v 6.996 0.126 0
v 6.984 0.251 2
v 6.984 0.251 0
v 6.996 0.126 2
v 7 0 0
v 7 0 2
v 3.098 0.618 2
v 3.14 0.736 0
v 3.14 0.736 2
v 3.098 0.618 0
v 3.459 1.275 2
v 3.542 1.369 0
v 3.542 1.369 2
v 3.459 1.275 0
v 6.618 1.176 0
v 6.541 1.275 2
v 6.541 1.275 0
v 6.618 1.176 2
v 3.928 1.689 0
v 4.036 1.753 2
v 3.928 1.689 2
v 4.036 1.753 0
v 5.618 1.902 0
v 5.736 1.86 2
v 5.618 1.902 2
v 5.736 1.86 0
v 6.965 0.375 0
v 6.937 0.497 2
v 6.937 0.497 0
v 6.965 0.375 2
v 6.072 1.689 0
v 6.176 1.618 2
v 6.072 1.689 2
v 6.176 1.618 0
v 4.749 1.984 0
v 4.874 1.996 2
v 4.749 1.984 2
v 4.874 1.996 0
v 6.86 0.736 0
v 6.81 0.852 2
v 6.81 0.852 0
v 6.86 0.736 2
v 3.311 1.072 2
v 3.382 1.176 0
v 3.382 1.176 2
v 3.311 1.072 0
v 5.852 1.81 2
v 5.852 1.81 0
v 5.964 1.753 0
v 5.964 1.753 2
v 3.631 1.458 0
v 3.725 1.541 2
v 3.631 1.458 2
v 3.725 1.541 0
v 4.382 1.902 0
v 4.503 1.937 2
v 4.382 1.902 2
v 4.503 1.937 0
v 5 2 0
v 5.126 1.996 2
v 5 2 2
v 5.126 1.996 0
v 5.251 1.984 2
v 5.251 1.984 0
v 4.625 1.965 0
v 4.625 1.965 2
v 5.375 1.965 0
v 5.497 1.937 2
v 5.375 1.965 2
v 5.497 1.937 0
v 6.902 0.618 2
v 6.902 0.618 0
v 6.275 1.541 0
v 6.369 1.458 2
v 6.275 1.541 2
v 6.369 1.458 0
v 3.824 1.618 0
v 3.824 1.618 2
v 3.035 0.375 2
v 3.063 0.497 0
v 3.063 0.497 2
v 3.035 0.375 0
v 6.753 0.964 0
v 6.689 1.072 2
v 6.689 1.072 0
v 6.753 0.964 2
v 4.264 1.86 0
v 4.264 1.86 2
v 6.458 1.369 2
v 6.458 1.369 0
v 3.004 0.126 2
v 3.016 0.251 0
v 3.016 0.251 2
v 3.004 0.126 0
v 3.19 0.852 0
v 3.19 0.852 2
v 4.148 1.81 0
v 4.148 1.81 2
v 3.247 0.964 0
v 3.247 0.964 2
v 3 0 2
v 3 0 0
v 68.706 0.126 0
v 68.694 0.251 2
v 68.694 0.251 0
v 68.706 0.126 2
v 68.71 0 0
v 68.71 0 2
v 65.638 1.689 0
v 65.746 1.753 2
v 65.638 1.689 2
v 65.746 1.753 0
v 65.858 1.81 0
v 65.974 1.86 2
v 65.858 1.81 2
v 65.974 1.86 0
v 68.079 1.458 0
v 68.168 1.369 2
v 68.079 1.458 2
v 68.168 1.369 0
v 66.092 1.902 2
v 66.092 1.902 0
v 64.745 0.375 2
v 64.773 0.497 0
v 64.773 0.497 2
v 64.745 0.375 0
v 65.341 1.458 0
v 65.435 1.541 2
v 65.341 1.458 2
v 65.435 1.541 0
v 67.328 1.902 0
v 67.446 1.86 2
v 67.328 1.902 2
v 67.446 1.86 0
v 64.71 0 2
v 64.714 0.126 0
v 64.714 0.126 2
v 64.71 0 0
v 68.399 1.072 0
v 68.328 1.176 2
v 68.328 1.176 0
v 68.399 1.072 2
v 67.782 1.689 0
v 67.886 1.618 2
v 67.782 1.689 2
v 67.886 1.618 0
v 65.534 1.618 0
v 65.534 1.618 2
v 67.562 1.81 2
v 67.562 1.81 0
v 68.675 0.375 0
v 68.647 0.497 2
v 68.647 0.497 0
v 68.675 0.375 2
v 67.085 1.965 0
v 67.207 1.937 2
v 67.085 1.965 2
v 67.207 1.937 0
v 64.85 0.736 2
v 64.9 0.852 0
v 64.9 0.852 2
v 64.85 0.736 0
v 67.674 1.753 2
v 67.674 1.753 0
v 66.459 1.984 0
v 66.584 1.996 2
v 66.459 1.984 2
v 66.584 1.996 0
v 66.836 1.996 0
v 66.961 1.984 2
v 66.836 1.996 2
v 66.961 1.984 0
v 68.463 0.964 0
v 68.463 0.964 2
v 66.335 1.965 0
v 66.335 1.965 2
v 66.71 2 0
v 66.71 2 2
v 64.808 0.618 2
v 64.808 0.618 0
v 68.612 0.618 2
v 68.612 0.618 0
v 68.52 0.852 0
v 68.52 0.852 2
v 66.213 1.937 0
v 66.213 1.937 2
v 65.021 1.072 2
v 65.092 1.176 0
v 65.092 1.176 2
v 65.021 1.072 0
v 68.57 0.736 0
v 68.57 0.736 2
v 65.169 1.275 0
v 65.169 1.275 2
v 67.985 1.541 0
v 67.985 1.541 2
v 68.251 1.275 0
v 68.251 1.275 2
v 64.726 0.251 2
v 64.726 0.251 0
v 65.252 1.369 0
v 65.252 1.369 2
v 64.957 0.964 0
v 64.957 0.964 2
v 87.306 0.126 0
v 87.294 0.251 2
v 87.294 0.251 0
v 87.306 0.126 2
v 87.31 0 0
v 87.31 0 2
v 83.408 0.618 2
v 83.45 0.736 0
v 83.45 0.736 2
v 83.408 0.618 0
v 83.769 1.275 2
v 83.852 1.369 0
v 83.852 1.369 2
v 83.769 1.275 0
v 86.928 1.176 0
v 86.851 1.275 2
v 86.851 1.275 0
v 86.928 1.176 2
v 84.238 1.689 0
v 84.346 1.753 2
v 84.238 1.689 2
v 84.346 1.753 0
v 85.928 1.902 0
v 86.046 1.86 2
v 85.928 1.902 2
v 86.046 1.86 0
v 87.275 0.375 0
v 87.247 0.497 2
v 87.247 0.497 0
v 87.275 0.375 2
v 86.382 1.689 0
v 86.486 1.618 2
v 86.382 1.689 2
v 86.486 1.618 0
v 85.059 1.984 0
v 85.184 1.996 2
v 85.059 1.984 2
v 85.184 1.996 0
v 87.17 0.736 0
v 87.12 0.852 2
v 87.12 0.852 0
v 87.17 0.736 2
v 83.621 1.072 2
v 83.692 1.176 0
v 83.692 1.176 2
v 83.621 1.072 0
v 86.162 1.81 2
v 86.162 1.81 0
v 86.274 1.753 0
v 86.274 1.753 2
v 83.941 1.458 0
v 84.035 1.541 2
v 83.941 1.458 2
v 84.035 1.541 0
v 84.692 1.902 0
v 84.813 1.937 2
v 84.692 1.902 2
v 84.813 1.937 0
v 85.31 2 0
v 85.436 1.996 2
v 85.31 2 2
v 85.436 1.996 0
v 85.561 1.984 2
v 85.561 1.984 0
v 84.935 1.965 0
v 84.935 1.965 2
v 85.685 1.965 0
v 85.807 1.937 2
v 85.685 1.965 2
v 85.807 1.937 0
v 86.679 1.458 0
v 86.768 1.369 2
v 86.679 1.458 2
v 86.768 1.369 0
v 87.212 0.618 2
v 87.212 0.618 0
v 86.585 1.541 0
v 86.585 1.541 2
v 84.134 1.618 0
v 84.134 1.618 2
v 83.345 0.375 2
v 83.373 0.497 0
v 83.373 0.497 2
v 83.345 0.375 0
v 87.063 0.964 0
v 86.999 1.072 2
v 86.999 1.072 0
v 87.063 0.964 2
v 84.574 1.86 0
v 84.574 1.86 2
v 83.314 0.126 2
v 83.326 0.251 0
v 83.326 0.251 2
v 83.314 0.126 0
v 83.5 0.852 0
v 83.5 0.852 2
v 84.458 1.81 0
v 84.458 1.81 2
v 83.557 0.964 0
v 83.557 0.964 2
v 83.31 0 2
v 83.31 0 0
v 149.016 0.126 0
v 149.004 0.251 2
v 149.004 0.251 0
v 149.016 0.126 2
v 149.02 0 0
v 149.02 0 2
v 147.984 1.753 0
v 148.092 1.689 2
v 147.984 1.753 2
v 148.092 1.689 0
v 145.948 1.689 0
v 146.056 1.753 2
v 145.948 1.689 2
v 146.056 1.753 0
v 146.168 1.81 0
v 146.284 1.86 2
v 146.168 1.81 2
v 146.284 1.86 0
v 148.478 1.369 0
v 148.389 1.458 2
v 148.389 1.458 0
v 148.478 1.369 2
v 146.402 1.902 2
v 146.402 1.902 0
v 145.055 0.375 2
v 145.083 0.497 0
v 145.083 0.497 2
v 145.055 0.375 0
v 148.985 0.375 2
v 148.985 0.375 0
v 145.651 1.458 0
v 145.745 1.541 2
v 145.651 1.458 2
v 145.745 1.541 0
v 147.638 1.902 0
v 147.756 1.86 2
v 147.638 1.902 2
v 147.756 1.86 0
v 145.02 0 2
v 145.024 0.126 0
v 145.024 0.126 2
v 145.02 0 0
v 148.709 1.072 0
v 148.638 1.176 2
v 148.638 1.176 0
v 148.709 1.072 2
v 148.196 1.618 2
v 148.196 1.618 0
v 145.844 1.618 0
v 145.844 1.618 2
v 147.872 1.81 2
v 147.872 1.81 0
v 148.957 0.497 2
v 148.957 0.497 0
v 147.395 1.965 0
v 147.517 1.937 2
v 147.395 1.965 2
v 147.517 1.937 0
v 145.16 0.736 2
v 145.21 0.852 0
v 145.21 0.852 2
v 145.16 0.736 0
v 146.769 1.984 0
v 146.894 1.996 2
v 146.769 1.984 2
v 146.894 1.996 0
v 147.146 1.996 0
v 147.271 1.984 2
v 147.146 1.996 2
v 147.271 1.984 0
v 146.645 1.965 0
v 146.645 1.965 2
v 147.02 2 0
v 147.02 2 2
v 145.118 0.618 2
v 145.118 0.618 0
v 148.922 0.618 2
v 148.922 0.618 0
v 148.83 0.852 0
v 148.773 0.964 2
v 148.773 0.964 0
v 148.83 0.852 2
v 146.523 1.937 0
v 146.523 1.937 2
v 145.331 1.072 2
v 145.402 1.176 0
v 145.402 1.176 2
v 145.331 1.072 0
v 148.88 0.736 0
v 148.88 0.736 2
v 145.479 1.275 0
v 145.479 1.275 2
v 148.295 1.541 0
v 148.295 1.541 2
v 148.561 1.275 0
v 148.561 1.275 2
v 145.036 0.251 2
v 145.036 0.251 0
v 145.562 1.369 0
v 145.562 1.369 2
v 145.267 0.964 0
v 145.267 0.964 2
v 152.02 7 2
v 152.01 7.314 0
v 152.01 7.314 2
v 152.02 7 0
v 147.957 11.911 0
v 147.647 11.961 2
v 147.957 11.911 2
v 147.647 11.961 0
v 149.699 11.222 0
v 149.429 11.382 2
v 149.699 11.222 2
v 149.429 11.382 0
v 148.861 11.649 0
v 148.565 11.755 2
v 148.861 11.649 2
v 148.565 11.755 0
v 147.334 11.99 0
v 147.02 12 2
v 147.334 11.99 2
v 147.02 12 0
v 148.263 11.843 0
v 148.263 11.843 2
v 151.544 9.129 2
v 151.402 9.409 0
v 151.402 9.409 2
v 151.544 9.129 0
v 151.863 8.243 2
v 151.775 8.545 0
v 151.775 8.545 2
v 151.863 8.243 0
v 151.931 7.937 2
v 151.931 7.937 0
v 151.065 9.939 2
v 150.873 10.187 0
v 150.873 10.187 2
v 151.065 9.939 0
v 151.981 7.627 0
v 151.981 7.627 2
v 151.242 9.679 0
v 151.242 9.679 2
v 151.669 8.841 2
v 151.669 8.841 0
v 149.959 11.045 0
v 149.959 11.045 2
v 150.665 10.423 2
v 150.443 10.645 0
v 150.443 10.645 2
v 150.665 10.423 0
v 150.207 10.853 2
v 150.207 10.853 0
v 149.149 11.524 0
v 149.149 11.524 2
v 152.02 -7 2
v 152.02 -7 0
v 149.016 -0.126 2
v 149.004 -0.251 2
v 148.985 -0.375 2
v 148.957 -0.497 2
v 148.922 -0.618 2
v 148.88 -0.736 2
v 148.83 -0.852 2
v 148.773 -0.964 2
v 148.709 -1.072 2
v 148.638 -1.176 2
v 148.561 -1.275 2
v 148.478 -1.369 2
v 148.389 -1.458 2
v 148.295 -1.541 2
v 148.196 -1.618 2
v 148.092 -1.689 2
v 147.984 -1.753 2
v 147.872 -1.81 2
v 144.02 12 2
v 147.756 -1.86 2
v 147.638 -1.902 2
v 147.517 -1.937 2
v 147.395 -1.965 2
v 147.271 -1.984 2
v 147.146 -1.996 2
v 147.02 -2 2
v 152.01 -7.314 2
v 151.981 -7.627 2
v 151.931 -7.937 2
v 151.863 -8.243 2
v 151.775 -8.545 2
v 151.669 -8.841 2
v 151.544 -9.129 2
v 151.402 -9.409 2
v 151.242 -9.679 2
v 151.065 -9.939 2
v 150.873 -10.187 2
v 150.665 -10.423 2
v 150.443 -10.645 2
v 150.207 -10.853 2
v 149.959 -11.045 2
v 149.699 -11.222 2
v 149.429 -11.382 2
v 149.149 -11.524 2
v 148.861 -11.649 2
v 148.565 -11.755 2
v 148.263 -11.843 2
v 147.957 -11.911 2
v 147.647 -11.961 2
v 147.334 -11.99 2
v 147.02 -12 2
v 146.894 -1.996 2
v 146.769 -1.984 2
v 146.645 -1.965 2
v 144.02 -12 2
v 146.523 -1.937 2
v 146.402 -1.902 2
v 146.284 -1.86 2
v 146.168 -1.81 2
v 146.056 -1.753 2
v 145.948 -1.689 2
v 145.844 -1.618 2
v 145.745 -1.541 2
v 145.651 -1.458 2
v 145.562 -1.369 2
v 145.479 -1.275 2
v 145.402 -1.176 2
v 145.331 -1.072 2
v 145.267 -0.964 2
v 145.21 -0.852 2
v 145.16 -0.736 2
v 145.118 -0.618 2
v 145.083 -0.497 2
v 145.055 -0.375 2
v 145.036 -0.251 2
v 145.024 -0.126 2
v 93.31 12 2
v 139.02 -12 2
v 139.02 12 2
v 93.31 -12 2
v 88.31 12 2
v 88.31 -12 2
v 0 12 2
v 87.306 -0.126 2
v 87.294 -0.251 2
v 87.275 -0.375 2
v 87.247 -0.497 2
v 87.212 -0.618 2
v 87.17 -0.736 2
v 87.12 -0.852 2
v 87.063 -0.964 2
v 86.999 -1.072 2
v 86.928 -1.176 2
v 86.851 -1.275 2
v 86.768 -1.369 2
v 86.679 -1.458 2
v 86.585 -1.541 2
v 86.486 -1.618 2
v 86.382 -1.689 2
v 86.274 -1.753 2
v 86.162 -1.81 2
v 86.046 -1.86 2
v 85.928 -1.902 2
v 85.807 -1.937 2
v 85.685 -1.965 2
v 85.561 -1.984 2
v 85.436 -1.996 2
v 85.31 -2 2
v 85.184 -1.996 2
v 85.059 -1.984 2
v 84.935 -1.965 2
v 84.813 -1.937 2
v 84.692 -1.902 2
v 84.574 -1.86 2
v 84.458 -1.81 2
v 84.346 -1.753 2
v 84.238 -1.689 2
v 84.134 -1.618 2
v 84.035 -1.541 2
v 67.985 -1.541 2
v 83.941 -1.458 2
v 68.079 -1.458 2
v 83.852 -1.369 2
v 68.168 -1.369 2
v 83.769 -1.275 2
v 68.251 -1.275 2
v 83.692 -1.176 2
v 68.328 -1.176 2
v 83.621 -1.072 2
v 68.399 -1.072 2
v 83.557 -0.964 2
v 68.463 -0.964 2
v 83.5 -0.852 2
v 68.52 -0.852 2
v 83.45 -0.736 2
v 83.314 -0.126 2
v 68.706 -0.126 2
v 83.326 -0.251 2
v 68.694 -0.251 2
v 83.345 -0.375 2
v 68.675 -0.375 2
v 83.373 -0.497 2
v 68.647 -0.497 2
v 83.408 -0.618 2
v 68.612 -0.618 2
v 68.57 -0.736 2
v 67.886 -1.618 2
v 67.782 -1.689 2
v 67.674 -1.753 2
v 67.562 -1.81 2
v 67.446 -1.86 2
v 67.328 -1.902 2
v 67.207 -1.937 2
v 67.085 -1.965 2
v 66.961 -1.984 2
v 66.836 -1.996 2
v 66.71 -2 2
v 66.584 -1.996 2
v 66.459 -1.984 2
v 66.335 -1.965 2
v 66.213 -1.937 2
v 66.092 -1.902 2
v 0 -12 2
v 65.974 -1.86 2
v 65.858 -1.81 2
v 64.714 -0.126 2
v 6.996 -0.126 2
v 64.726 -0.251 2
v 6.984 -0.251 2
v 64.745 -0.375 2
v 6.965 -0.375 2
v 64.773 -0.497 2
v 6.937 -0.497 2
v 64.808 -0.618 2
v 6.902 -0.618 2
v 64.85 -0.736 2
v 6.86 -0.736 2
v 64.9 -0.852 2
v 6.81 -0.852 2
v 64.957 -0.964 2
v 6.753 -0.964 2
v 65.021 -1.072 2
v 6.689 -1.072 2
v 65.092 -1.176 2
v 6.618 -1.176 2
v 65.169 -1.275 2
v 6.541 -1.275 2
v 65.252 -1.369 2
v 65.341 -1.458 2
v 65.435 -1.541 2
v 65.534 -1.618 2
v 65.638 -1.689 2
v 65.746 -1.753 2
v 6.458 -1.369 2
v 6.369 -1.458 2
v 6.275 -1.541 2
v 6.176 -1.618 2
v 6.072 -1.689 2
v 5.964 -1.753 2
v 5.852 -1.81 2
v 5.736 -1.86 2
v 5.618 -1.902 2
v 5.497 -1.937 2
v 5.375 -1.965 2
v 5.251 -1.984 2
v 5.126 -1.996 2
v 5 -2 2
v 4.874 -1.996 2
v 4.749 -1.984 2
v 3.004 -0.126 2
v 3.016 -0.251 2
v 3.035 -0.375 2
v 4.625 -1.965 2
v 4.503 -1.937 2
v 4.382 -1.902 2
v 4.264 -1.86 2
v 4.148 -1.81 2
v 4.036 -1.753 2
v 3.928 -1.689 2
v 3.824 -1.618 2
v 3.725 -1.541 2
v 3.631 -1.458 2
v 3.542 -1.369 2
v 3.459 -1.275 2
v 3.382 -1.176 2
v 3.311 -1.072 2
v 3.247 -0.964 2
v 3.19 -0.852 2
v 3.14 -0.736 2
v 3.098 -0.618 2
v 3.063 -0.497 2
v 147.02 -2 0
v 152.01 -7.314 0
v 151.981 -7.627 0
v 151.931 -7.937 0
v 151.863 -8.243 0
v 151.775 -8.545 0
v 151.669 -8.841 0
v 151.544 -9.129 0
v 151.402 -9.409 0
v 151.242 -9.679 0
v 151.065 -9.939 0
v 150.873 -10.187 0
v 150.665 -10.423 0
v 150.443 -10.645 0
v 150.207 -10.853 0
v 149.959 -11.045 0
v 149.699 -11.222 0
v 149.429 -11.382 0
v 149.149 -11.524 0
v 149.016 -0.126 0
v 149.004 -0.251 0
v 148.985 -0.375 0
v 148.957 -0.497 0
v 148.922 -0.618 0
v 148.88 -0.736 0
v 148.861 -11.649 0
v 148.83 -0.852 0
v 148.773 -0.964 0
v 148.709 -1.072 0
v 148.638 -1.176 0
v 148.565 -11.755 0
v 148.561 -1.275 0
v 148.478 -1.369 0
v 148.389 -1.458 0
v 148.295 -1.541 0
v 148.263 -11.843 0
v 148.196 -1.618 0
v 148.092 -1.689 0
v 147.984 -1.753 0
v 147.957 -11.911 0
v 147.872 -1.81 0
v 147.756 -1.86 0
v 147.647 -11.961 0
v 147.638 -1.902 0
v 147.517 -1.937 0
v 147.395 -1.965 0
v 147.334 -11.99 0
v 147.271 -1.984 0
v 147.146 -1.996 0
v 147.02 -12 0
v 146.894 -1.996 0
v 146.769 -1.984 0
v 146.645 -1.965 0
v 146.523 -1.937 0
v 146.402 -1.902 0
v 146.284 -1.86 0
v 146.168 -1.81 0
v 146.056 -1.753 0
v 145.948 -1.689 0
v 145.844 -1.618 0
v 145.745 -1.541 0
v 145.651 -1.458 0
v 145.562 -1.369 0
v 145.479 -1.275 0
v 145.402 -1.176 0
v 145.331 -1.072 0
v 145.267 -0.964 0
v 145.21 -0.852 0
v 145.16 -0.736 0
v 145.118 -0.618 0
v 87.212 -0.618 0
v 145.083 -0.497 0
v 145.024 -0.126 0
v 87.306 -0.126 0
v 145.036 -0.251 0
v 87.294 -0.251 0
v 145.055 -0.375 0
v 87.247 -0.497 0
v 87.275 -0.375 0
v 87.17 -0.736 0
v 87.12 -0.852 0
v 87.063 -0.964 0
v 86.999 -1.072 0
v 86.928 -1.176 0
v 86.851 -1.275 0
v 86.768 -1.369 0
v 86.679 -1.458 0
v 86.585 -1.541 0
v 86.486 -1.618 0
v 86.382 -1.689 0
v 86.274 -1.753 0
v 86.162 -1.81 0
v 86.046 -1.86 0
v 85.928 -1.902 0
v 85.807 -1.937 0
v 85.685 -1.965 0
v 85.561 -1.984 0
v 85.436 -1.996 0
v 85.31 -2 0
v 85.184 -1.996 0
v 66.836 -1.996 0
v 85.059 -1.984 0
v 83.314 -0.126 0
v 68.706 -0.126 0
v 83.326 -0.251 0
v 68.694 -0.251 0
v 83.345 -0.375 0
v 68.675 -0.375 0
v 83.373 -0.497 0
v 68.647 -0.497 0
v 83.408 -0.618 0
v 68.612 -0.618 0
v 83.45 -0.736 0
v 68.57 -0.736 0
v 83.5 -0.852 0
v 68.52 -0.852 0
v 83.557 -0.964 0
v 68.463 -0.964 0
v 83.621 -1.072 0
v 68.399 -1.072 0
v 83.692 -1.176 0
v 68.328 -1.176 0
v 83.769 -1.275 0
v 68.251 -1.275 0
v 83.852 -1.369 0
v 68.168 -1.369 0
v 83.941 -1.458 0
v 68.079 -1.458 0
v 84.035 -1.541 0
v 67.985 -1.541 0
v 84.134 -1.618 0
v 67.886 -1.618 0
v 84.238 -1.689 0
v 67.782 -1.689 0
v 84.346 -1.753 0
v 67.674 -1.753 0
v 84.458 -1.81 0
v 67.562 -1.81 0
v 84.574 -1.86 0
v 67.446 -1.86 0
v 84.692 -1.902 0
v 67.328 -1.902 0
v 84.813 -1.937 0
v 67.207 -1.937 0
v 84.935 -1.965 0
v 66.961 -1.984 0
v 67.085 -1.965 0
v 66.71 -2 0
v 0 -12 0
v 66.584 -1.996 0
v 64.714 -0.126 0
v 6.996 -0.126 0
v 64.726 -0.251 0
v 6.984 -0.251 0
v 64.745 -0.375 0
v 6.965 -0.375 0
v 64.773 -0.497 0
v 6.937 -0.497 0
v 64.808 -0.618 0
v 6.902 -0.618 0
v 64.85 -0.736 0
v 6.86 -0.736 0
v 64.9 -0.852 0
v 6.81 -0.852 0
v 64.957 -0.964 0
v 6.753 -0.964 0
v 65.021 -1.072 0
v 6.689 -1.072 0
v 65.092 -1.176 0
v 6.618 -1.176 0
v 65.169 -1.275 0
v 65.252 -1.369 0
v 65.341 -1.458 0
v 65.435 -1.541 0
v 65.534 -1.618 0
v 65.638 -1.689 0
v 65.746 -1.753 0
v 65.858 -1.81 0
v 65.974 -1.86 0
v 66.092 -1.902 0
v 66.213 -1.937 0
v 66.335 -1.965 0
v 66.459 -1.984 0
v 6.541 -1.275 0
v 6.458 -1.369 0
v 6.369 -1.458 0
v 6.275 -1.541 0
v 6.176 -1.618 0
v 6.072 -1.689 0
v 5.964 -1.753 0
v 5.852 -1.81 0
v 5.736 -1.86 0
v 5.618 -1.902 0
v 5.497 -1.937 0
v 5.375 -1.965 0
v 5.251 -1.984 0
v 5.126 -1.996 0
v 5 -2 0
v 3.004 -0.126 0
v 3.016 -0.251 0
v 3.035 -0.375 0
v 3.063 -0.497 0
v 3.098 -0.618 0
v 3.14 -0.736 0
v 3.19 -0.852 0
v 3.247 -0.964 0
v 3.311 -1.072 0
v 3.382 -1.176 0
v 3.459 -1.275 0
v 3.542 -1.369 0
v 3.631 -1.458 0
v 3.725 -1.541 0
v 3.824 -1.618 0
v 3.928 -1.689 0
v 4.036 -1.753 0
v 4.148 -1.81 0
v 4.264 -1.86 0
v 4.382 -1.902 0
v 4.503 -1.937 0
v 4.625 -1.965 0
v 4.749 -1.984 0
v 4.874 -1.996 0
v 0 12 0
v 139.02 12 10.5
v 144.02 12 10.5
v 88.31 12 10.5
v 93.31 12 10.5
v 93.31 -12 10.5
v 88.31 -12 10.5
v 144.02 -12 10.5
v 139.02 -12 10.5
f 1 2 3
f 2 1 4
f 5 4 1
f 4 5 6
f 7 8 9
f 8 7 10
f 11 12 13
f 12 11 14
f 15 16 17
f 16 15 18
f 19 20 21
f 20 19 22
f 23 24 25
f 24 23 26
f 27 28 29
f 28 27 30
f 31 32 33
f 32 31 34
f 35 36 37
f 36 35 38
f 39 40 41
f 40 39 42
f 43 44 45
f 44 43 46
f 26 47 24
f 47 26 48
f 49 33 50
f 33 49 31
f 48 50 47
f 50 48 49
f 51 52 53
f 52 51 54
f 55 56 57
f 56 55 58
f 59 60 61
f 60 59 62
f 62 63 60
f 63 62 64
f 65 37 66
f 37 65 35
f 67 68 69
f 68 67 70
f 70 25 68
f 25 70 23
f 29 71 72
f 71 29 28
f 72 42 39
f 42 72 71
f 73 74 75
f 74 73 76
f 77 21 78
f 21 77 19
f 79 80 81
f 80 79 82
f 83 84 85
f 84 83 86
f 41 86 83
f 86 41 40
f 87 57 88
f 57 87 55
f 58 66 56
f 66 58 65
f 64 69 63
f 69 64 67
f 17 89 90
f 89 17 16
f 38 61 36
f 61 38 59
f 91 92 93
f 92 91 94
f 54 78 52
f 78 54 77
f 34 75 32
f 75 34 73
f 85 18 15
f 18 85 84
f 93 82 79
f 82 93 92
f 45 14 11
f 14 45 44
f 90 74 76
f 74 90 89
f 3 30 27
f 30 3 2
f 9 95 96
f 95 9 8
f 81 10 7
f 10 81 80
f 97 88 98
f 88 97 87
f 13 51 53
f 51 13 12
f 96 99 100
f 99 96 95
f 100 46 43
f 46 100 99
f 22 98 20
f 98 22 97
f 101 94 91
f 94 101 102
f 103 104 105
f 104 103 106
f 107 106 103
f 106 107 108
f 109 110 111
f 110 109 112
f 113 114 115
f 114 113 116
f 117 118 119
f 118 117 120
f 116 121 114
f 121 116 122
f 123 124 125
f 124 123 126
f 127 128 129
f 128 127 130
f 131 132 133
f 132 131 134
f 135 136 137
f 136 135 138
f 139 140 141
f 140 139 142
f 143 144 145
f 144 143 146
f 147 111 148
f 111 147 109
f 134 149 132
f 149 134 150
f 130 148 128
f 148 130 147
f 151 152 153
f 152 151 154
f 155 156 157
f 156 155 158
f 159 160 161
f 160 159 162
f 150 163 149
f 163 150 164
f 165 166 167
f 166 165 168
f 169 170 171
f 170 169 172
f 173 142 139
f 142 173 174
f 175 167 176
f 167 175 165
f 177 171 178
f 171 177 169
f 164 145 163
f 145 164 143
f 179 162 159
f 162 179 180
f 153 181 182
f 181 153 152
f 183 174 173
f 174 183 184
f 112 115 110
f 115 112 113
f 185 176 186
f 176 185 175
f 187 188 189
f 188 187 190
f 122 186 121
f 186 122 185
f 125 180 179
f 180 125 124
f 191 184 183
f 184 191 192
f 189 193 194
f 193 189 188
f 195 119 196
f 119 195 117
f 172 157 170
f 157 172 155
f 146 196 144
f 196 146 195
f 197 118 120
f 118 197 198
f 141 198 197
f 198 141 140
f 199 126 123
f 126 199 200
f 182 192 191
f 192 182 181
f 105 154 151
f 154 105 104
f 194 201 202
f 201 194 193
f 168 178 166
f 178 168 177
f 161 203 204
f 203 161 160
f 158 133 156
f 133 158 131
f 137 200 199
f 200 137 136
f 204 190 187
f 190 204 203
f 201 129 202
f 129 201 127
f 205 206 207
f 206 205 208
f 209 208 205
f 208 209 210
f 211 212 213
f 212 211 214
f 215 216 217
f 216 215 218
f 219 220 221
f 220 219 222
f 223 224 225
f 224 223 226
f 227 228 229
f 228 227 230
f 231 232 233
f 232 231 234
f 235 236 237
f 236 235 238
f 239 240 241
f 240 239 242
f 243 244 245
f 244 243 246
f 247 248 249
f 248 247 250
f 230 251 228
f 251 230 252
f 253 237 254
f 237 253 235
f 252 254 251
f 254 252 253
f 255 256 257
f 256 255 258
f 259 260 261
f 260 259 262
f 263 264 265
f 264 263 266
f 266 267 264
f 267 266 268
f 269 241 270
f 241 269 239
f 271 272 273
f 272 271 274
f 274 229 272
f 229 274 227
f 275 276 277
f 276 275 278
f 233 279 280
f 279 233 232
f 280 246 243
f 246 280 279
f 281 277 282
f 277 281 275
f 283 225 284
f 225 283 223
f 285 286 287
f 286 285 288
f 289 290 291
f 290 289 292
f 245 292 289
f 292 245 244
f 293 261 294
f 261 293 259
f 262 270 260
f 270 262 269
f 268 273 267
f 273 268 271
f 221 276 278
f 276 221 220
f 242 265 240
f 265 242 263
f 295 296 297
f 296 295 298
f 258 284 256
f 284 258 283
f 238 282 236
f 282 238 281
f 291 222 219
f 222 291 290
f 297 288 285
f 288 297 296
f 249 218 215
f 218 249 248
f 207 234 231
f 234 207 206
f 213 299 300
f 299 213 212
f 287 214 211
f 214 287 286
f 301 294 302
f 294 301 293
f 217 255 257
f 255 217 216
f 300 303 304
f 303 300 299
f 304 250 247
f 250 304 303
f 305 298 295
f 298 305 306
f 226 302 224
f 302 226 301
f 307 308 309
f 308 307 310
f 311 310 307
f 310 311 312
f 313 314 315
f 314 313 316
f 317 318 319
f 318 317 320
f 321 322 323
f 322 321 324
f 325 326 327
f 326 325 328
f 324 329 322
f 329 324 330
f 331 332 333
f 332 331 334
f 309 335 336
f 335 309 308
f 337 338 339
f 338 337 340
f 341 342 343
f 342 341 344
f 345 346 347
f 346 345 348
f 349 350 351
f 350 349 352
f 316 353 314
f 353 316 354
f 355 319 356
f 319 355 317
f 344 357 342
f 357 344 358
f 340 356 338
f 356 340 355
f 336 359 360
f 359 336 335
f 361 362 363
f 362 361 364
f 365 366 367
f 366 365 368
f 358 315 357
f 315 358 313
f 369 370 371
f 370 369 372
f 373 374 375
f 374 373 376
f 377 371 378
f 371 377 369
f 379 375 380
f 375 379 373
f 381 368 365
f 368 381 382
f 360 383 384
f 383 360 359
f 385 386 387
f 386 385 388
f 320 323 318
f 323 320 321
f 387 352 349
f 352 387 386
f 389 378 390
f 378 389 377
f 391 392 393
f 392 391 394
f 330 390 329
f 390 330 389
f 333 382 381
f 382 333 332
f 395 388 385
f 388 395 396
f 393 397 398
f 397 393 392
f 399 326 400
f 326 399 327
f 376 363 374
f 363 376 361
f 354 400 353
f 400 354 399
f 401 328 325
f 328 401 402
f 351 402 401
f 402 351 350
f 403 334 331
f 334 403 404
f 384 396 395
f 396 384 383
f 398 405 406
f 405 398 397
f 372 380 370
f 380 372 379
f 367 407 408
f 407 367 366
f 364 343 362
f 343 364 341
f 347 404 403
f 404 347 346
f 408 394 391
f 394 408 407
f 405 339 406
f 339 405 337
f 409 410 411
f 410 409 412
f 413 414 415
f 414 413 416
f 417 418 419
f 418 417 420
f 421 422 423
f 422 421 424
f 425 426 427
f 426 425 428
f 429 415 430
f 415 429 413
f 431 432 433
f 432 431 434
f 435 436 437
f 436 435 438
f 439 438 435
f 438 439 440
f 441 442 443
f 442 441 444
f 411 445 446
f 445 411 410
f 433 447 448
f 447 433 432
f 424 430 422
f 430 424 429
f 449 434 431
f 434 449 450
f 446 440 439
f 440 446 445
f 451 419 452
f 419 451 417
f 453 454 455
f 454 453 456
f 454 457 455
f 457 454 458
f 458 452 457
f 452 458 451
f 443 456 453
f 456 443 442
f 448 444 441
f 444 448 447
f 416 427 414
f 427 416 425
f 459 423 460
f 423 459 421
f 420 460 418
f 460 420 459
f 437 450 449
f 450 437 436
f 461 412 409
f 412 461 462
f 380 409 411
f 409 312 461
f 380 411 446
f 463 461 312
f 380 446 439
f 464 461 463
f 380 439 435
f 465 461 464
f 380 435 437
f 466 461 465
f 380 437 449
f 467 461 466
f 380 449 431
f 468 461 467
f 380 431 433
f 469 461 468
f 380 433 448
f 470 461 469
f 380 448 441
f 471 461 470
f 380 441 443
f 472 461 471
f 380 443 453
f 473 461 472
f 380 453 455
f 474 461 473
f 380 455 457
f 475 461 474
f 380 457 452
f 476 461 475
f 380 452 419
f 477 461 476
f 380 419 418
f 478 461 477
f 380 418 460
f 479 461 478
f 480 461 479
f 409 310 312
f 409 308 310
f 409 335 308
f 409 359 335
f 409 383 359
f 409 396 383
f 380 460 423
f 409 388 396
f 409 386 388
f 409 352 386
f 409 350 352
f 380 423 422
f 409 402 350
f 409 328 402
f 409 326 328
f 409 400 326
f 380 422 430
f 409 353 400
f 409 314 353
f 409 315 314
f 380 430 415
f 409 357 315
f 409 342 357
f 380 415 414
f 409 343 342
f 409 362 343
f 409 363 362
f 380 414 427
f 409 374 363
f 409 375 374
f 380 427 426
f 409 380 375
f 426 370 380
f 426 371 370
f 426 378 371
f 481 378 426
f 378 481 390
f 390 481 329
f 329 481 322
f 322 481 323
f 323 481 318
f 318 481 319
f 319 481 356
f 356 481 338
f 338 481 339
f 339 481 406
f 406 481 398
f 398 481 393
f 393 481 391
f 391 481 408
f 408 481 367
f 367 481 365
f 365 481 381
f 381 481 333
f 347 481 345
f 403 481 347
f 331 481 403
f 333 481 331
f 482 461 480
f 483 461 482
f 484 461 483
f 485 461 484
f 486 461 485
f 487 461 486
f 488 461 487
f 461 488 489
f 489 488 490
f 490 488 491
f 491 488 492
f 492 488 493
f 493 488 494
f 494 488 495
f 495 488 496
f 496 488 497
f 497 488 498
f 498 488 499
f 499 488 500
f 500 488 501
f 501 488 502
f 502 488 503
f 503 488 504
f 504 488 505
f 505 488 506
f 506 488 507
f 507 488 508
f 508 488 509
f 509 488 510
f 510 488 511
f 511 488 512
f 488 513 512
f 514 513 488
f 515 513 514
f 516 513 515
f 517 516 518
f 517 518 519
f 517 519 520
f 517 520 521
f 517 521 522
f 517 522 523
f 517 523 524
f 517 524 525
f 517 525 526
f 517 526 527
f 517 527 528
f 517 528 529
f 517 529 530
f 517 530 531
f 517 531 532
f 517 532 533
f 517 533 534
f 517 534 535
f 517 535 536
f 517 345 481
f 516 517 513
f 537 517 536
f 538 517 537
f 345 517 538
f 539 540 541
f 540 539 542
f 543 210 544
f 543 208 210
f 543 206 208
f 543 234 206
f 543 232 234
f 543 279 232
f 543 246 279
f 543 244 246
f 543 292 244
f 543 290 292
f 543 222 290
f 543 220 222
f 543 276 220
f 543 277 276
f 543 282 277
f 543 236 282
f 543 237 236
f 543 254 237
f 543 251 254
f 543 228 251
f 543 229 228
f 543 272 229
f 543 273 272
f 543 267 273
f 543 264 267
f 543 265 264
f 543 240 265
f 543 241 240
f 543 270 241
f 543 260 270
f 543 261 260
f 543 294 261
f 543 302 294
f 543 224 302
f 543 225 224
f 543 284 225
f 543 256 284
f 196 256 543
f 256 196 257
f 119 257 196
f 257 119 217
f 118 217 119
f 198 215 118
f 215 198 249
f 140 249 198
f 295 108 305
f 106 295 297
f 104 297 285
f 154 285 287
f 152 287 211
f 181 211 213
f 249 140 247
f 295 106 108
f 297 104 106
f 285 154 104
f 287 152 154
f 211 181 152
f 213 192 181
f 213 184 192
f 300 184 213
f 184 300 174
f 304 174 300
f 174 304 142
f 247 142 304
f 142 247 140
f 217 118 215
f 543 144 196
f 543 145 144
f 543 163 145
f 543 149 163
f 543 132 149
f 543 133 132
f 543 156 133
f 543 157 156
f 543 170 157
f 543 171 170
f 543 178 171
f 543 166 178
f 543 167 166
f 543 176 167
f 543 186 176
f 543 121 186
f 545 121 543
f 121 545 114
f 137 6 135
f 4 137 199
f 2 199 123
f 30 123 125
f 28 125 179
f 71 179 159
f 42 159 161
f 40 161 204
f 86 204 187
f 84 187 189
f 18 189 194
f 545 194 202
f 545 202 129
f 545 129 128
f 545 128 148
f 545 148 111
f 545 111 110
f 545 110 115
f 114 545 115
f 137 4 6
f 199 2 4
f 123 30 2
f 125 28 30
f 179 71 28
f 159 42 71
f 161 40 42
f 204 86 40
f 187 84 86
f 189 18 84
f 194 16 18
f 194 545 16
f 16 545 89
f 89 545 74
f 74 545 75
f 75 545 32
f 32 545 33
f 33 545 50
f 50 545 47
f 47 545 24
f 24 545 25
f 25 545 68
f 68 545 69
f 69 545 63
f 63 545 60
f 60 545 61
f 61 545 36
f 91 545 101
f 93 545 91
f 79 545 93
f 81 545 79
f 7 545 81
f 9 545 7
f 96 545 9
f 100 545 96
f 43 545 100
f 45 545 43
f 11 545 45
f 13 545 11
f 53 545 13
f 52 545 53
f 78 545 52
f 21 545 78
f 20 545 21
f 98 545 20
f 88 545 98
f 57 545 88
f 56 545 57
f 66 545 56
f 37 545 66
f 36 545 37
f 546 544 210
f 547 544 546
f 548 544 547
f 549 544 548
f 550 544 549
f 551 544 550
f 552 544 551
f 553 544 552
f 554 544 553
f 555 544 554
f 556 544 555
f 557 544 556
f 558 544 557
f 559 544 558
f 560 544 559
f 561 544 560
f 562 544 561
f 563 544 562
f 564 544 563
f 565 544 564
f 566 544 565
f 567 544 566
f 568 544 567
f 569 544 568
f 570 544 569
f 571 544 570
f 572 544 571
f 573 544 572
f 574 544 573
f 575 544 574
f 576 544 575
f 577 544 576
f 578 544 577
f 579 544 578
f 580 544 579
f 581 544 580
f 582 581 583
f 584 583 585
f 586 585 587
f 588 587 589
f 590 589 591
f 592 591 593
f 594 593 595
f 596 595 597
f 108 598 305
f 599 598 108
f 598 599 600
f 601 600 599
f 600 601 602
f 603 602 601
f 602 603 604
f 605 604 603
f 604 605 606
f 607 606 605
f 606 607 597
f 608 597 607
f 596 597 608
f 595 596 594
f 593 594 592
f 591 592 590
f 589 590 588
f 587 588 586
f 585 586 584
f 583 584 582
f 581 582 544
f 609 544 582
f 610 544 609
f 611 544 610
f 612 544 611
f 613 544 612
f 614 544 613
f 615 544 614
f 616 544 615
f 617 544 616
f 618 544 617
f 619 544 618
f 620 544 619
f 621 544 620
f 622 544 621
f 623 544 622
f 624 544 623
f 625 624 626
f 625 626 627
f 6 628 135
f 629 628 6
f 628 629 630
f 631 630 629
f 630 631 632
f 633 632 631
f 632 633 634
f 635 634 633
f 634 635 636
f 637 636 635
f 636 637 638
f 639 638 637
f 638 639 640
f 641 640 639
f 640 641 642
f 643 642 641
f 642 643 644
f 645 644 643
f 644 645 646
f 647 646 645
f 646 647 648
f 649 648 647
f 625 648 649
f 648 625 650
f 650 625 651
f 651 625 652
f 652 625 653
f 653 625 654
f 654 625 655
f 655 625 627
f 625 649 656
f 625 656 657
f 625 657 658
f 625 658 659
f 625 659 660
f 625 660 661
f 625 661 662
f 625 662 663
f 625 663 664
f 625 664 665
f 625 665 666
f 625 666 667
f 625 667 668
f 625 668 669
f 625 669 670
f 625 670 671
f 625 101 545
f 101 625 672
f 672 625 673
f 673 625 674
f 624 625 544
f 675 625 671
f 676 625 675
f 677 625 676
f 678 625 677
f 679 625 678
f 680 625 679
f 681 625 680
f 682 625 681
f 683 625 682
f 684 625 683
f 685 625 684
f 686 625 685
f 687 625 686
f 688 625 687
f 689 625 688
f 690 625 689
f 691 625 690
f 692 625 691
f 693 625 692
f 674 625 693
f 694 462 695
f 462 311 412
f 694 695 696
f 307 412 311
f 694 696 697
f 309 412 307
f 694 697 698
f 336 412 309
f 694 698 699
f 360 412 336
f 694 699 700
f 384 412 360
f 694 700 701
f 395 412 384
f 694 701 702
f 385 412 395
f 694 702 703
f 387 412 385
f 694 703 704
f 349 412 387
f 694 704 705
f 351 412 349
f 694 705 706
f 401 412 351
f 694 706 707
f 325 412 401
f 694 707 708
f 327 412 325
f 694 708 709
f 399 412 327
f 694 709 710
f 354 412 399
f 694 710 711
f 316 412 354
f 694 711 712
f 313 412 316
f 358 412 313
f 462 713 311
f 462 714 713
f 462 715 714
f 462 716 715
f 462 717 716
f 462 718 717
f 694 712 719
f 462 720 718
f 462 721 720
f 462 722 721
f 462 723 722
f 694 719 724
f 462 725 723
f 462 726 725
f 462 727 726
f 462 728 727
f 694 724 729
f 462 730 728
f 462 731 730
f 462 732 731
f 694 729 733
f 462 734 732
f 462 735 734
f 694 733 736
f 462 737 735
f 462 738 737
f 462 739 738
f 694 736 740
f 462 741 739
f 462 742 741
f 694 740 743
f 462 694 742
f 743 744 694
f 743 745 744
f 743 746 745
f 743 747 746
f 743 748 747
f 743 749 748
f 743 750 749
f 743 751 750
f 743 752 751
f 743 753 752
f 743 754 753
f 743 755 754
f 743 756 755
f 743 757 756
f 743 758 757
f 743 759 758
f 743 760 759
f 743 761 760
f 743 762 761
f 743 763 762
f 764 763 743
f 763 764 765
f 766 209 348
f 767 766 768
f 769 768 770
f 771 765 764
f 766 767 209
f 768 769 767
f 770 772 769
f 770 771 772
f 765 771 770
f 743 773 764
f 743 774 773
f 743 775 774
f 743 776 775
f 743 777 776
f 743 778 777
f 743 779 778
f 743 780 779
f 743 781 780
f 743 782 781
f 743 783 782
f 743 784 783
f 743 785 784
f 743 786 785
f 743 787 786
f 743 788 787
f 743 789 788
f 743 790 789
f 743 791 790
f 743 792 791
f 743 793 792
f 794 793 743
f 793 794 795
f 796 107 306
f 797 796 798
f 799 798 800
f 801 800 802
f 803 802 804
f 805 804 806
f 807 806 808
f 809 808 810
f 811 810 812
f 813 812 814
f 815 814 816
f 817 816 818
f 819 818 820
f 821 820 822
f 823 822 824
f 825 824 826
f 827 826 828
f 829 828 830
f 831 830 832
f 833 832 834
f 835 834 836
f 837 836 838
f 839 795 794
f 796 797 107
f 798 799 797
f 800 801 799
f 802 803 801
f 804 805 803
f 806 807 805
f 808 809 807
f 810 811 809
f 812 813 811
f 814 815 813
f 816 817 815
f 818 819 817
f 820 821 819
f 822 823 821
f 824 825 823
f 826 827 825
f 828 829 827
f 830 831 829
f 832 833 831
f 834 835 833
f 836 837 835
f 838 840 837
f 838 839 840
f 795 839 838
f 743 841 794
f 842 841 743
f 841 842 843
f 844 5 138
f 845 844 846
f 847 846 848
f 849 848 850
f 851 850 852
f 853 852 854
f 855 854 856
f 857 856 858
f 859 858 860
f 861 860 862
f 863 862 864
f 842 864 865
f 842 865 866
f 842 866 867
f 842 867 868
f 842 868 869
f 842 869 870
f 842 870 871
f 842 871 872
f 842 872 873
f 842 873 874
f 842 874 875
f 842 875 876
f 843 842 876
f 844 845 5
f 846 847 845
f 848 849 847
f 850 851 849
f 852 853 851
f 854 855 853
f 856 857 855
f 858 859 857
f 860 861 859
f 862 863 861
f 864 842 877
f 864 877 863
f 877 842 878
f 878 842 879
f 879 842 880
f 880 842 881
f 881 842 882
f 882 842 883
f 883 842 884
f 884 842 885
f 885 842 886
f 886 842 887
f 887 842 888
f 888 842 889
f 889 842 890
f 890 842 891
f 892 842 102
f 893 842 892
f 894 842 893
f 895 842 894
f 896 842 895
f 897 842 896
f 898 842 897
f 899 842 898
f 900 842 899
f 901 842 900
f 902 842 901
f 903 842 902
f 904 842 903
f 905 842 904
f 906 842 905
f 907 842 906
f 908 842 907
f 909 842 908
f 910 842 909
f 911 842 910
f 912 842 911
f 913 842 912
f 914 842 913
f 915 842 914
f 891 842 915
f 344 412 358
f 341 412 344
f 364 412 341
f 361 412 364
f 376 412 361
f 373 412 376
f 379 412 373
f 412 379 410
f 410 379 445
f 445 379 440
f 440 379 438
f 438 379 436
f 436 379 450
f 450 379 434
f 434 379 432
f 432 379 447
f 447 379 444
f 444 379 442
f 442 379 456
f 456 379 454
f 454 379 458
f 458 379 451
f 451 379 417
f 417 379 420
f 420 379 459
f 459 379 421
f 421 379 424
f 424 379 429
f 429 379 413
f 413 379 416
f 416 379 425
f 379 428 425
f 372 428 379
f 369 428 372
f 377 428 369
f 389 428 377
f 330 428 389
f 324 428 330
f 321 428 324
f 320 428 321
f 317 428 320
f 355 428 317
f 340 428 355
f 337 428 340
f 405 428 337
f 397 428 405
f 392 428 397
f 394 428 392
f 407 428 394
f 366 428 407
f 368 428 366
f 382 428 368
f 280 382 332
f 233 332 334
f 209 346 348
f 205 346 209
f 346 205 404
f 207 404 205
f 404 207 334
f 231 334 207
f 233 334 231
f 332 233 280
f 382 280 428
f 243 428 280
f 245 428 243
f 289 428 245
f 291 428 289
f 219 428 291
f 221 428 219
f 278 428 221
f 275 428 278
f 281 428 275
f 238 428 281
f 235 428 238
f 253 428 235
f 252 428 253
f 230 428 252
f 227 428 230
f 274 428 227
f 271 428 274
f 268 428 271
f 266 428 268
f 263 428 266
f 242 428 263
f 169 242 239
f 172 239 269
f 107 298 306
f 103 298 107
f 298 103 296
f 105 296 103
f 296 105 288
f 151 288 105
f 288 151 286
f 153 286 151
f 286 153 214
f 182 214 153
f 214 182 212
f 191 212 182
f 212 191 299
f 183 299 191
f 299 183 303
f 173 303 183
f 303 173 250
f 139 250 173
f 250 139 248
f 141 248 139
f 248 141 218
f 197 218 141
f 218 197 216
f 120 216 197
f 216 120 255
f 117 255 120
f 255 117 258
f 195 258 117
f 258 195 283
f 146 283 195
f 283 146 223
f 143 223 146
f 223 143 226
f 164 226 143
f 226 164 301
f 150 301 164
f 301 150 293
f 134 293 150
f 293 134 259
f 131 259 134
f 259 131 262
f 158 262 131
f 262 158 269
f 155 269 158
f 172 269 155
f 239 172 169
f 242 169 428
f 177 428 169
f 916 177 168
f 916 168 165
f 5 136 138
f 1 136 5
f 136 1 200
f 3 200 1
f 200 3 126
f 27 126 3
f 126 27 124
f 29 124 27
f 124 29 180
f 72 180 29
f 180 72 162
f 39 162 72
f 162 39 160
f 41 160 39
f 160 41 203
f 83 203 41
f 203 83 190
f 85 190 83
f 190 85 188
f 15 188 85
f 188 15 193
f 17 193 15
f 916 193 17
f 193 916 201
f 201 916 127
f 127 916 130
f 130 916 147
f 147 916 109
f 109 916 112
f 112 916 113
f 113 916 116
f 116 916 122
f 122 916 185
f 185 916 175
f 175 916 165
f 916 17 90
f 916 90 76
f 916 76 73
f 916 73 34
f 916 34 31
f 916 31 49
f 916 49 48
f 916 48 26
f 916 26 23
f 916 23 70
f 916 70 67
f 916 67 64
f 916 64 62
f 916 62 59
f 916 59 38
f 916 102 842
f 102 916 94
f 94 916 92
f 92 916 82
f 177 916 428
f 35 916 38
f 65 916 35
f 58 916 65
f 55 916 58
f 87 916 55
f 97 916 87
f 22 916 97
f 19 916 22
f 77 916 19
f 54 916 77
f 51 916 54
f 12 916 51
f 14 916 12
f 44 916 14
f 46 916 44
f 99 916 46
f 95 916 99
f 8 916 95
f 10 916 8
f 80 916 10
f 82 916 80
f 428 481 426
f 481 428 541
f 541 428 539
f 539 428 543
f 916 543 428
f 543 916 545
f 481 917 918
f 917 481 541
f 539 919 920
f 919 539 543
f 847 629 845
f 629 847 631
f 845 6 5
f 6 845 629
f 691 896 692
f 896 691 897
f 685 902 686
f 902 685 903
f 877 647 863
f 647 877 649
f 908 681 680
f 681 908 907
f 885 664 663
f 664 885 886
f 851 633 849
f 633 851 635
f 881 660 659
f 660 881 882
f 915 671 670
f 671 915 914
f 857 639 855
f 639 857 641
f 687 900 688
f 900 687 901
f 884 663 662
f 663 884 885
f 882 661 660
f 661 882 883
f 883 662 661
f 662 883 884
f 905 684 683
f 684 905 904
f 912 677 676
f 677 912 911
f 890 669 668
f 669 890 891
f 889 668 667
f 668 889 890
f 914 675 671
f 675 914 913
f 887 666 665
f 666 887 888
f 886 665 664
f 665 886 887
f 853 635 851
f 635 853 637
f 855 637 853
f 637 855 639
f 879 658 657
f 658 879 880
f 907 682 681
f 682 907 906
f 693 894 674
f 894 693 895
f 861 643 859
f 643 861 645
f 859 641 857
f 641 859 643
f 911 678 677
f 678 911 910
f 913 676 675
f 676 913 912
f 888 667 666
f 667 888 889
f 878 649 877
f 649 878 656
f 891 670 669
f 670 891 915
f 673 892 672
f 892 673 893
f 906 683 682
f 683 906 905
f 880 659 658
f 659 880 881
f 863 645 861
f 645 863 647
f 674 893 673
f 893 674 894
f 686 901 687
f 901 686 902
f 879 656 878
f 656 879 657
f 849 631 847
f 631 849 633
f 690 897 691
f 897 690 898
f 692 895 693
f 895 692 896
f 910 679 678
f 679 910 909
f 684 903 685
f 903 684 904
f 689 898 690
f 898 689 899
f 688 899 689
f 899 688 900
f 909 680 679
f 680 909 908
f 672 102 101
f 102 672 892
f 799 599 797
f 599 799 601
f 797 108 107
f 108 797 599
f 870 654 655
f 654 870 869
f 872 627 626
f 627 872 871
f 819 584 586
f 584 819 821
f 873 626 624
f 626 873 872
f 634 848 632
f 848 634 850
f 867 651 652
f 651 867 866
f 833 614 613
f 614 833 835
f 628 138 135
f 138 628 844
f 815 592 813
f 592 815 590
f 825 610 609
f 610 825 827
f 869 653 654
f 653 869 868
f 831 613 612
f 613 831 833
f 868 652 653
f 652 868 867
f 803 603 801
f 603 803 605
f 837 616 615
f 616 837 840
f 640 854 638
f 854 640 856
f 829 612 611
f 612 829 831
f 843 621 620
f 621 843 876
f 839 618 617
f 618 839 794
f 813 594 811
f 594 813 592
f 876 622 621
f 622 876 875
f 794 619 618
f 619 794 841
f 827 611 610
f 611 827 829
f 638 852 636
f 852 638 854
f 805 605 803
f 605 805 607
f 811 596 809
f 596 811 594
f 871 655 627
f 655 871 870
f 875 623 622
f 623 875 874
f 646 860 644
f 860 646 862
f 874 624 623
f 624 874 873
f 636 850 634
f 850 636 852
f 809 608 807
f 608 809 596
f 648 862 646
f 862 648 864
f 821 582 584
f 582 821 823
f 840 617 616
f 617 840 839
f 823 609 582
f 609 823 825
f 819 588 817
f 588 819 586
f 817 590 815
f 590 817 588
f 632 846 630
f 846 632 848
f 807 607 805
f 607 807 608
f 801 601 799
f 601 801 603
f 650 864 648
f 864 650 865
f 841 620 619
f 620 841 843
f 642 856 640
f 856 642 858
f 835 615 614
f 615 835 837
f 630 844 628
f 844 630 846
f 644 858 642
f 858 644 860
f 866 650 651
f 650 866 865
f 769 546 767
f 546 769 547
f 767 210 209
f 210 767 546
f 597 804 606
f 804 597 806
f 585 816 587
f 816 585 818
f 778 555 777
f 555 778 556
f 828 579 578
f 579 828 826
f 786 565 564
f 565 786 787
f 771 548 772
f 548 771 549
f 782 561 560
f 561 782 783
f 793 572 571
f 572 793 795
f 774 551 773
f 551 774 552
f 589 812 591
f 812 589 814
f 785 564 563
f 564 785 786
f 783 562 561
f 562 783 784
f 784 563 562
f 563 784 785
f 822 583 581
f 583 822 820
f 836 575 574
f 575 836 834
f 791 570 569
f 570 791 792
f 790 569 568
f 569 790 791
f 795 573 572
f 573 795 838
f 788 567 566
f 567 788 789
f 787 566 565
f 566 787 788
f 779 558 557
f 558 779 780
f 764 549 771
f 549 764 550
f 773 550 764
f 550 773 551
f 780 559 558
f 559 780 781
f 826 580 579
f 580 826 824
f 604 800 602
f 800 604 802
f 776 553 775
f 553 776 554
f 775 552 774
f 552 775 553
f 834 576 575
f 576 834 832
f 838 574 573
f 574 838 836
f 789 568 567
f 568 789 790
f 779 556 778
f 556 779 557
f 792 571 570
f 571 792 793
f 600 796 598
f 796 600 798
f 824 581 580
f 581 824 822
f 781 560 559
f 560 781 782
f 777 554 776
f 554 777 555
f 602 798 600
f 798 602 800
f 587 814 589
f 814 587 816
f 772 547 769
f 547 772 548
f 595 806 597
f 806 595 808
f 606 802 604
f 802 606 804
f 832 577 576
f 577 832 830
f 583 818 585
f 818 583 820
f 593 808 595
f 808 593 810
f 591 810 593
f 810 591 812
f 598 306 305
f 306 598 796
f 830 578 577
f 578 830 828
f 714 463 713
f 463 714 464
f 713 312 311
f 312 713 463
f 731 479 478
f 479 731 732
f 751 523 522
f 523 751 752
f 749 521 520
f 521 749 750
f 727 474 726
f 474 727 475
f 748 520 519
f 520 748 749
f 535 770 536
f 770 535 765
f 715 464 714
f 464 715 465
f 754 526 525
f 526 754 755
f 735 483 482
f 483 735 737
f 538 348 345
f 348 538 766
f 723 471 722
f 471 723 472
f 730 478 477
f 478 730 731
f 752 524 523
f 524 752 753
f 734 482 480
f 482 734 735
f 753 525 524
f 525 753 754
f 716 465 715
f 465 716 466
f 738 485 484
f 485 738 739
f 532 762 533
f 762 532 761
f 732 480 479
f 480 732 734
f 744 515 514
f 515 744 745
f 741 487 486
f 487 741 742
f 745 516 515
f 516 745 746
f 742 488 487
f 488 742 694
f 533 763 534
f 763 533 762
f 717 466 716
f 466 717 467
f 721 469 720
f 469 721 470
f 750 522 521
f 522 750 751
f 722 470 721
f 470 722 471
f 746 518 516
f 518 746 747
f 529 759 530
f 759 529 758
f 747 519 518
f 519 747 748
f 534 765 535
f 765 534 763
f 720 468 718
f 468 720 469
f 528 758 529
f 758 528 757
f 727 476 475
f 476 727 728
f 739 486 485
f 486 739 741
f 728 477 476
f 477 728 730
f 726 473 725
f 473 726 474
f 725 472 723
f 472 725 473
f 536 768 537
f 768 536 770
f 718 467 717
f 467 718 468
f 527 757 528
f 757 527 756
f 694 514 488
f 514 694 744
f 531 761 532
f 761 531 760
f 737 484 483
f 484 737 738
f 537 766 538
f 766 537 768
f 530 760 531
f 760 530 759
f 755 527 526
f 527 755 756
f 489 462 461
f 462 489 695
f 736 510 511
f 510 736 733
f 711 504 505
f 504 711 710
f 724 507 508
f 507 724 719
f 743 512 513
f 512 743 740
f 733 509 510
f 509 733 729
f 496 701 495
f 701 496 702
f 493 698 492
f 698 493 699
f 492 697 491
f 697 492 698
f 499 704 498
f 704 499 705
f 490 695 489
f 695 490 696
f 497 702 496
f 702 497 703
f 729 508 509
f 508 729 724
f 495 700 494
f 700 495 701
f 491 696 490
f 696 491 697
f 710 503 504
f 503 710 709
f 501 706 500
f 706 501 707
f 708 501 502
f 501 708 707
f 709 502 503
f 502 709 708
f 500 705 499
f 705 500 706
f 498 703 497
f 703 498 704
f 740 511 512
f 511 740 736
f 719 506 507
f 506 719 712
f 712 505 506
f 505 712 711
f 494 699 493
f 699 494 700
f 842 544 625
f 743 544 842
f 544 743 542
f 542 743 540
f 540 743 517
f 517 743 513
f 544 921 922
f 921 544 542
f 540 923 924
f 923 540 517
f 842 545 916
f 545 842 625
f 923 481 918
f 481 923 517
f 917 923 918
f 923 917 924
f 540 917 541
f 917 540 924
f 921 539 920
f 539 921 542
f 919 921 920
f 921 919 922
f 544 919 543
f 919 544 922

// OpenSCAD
$fa = 1;
$fs = 0.5;
$fn = 100;

ssd_std_hole_spacing = 61.71;
ssd_group_spacing = 18.6;
relocation_spacing = 10;
ends_to_holes = 5;
bracket_length = ends_to_holes + 2 * ssd_std_hole_spacing + ssd_group_spacing + relocation_spacing / 2;

module ssd_holes() {
    cylinder(r=2, h=5);
    translate([ssd_std_hole_spacing, 0, 0]) {
        cylinder(r=2, h=5);
    }
}

module half_x_bracket() {    
    difference(){
        // Bracket body.
        cube([bracket_length, 12, 2]);
        
        // Holes.
        translate([relocation_spacing / 2, 0, -1]) {
            ssd_holes();
            translate([ssd_std_hole_spacing + ssd_group_spacing, 0, 0]) {
                ssd_holes();
            }
        }
        
        // Bevel.
        translate([bracket_length - 5, 7, -5]) {
            difference() {
                cube([6, 6, 12]);
                translate([0, 0, -1]) {
                    cylinder(r=5, h=14);
                }
            }
        }
    }
}

module half_y_bracket() {
    half_x_bracket();
    mirror([1,0,0]){
        half_x_bracket();
    }
}

difference() {
    union(){
        half_y_bracket();
        mirror([0, 1, 0]) {
            half_y_bracket();
        }
    }
    
    translate([-bracket_length - 1, -13, -2]){
        cube([bracket_length + 1, 26, 5]); 
    }
}

module supports() {
    translate([bracket_length - 13, -12, 2]){
        cube([5, 24, 8.5]);
    }

    translate([bracket_length - ssd_std_hole_spacing - 2, -12, 2]){
        cube([5, 24, 8.5]);
    }
}

supports();
